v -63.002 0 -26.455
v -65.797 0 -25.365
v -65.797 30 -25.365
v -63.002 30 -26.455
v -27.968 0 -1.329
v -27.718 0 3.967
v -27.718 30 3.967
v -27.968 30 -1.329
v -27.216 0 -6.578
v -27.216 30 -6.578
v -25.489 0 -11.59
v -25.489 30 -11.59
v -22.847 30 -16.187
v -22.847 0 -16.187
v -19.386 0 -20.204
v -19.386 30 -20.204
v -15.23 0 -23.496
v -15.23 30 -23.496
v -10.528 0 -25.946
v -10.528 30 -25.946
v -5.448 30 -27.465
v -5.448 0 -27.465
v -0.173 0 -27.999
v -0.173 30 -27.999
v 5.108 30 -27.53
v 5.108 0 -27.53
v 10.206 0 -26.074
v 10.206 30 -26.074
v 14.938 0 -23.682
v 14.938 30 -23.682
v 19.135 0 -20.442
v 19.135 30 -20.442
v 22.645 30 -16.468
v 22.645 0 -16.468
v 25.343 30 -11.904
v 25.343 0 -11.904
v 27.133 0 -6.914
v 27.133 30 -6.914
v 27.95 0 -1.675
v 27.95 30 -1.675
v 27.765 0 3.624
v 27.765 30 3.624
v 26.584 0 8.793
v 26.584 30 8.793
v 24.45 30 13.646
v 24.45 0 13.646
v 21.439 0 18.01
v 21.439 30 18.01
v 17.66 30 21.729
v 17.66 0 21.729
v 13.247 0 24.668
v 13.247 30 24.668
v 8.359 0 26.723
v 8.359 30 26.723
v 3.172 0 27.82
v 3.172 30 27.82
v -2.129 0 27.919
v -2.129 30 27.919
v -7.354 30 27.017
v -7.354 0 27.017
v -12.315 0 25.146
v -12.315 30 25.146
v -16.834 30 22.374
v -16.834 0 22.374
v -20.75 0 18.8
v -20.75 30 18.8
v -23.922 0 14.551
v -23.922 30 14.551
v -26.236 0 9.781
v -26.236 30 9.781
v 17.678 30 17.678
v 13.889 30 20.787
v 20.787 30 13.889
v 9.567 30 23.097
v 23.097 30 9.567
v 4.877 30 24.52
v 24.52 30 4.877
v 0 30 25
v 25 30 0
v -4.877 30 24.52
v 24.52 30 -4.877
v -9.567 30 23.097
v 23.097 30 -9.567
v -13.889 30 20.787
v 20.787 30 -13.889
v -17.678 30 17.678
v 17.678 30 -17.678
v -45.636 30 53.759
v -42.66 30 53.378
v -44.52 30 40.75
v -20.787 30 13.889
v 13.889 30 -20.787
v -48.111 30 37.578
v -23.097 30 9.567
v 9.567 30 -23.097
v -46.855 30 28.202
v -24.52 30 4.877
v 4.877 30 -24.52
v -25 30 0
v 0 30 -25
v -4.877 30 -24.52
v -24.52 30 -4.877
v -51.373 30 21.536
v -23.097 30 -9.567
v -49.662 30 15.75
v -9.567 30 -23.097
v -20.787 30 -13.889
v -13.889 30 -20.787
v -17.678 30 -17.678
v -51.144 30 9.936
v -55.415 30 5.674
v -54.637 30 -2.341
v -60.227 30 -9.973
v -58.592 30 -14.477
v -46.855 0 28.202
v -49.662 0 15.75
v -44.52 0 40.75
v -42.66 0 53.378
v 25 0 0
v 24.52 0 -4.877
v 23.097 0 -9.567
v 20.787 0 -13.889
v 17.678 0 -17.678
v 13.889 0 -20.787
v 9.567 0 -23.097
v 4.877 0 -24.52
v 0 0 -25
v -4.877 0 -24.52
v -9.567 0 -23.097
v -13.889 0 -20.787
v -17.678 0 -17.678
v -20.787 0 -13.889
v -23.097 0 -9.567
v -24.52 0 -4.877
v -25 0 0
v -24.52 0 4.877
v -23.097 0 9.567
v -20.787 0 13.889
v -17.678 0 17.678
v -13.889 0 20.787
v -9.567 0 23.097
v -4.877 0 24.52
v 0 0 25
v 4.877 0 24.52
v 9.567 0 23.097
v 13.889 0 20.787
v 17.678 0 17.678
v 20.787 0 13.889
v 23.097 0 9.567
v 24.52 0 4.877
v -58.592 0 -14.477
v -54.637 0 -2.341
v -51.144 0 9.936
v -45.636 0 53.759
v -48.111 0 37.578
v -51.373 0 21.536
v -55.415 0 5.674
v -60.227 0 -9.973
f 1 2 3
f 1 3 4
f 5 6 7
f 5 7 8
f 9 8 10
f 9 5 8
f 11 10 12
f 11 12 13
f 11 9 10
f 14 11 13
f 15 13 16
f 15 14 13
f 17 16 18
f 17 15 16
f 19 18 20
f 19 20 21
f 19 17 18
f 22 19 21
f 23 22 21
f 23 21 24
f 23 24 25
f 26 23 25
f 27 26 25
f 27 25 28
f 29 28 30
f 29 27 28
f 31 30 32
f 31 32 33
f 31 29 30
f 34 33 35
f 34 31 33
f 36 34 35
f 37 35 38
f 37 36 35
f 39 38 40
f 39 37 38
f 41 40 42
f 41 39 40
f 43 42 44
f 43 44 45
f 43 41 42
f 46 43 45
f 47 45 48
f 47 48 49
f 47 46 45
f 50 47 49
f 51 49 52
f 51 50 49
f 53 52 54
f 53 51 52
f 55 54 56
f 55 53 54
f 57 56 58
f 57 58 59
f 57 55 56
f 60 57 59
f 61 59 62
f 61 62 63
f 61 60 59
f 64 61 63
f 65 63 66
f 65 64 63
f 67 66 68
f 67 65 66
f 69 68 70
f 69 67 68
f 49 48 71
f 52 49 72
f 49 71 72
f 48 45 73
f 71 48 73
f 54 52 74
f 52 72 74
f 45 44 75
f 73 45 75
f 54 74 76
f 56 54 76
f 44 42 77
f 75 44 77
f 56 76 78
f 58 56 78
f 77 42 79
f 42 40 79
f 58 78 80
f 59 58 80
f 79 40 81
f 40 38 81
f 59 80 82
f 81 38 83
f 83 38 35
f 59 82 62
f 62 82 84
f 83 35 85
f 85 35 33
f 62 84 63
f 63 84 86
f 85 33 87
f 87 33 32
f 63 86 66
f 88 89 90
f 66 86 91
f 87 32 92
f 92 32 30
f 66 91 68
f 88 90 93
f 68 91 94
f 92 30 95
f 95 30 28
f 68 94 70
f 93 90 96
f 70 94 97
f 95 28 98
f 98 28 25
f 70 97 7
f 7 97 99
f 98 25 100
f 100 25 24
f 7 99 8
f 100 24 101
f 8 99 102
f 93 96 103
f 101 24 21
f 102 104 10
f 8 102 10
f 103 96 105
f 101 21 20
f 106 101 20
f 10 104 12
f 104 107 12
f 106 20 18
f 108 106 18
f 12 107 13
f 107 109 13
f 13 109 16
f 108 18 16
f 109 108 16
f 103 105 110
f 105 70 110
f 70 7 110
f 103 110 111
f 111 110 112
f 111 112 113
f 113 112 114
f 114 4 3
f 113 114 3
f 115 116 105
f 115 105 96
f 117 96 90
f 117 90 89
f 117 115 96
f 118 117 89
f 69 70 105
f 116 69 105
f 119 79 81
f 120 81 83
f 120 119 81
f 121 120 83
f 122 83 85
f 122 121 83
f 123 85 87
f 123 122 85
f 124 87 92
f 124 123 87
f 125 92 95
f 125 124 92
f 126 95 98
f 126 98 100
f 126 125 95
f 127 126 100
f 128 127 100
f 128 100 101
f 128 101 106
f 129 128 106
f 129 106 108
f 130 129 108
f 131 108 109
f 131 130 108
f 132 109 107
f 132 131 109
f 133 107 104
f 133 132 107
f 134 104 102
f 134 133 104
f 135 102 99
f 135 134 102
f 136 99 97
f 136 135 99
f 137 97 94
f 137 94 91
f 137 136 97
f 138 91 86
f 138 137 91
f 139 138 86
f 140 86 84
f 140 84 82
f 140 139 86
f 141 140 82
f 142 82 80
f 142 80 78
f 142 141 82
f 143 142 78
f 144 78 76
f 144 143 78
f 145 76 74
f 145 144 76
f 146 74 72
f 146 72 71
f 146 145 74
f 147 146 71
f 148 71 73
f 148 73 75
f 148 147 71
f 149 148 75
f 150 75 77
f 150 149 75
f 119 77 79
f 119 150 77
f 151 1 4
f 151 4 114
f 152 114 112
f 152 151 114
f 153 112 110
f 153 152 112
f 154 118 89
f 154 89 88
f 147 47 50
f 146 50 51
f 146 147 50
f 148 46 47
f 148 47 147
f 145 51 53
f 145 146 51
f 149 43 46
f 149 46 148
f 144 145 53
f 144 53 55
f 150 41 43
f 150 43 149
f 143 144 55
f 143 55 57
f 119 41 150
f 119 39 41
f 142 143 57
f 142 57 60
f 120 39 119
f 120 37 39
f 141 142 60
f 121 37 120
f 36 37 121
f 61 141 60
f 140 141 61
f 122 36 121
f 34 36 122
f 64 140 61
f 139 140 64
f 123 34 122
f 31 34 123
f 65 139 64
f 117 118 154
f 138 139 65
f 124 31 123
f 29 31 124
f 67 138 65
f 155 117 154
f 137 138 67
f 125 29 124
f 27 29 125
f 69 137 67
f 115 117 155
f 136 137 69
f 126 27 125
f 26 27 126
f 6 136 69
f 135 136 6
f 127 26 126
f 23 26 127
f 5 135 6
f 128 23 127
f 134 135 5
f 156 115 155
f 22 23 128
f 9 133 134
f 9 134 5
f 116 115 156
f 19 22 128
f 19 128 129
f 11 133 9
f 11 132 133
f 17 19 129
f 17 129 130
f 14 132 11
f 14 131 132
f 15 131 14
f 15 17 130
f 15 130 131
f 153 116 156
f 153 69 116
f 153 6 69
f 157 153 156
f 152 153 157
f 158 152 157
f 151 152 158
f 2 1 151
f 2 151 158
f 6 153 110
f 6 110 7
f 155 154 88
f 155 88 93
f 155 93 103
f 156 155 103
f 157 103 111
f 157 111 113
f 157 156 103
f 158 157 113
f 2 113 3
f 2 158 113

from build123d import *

# Parameters (mm, degrees)
CROQUIS1_R              = 25
SALIENTE_EXTRUIR1_DEPTH = 30


with BuildPart() as part:
    # Croquis1 → Saliente-Extruir1 (new body)
    with BuildSketch(Plane(origin=(0, 0, 0), x_dir=(1, 0, 0), z_dir=(0, 1, 0))):
        with BuildLine():
            Line((-65.797376832, 25.36524745), (-63.002208753, 26.454758997))
            ThreePointArc((-63.002208753, 26.454758997), (-56.557387251, 8.427488435), (-51.143577362, -9.935759386))
            Line((-51.143577362, -9.935759386), (-27.717597065, -3.966713114))
            ThreePointArc((-27.717597065, -3.966713114), (27.133039517, 6.913621813), (-26.236106677, -9.780935868))
            Line((-26.236106677, -9.780935868), (-49.662086973, -15.74998214))
            ThreePointArc((-49.662086973, -15.74998214), (-45.628225194, -34.464847013), (-42.660438023, -53.378081728))
            Line((-42.660438023, -53.378081728), (-45.636154363, -53.759017766))
            ThreePointArc((-45.636154363, -53.759017766), (-53.297041908, -13.580328562), (-65.797376832, 25.36524745))
        make_face()
        Circle(CROQUIS1_R, mode=Mode.SUBTRACT)
    extrude(amount=SALIENTE_EXTRUIR1_DEPTH)


solid = part.part
